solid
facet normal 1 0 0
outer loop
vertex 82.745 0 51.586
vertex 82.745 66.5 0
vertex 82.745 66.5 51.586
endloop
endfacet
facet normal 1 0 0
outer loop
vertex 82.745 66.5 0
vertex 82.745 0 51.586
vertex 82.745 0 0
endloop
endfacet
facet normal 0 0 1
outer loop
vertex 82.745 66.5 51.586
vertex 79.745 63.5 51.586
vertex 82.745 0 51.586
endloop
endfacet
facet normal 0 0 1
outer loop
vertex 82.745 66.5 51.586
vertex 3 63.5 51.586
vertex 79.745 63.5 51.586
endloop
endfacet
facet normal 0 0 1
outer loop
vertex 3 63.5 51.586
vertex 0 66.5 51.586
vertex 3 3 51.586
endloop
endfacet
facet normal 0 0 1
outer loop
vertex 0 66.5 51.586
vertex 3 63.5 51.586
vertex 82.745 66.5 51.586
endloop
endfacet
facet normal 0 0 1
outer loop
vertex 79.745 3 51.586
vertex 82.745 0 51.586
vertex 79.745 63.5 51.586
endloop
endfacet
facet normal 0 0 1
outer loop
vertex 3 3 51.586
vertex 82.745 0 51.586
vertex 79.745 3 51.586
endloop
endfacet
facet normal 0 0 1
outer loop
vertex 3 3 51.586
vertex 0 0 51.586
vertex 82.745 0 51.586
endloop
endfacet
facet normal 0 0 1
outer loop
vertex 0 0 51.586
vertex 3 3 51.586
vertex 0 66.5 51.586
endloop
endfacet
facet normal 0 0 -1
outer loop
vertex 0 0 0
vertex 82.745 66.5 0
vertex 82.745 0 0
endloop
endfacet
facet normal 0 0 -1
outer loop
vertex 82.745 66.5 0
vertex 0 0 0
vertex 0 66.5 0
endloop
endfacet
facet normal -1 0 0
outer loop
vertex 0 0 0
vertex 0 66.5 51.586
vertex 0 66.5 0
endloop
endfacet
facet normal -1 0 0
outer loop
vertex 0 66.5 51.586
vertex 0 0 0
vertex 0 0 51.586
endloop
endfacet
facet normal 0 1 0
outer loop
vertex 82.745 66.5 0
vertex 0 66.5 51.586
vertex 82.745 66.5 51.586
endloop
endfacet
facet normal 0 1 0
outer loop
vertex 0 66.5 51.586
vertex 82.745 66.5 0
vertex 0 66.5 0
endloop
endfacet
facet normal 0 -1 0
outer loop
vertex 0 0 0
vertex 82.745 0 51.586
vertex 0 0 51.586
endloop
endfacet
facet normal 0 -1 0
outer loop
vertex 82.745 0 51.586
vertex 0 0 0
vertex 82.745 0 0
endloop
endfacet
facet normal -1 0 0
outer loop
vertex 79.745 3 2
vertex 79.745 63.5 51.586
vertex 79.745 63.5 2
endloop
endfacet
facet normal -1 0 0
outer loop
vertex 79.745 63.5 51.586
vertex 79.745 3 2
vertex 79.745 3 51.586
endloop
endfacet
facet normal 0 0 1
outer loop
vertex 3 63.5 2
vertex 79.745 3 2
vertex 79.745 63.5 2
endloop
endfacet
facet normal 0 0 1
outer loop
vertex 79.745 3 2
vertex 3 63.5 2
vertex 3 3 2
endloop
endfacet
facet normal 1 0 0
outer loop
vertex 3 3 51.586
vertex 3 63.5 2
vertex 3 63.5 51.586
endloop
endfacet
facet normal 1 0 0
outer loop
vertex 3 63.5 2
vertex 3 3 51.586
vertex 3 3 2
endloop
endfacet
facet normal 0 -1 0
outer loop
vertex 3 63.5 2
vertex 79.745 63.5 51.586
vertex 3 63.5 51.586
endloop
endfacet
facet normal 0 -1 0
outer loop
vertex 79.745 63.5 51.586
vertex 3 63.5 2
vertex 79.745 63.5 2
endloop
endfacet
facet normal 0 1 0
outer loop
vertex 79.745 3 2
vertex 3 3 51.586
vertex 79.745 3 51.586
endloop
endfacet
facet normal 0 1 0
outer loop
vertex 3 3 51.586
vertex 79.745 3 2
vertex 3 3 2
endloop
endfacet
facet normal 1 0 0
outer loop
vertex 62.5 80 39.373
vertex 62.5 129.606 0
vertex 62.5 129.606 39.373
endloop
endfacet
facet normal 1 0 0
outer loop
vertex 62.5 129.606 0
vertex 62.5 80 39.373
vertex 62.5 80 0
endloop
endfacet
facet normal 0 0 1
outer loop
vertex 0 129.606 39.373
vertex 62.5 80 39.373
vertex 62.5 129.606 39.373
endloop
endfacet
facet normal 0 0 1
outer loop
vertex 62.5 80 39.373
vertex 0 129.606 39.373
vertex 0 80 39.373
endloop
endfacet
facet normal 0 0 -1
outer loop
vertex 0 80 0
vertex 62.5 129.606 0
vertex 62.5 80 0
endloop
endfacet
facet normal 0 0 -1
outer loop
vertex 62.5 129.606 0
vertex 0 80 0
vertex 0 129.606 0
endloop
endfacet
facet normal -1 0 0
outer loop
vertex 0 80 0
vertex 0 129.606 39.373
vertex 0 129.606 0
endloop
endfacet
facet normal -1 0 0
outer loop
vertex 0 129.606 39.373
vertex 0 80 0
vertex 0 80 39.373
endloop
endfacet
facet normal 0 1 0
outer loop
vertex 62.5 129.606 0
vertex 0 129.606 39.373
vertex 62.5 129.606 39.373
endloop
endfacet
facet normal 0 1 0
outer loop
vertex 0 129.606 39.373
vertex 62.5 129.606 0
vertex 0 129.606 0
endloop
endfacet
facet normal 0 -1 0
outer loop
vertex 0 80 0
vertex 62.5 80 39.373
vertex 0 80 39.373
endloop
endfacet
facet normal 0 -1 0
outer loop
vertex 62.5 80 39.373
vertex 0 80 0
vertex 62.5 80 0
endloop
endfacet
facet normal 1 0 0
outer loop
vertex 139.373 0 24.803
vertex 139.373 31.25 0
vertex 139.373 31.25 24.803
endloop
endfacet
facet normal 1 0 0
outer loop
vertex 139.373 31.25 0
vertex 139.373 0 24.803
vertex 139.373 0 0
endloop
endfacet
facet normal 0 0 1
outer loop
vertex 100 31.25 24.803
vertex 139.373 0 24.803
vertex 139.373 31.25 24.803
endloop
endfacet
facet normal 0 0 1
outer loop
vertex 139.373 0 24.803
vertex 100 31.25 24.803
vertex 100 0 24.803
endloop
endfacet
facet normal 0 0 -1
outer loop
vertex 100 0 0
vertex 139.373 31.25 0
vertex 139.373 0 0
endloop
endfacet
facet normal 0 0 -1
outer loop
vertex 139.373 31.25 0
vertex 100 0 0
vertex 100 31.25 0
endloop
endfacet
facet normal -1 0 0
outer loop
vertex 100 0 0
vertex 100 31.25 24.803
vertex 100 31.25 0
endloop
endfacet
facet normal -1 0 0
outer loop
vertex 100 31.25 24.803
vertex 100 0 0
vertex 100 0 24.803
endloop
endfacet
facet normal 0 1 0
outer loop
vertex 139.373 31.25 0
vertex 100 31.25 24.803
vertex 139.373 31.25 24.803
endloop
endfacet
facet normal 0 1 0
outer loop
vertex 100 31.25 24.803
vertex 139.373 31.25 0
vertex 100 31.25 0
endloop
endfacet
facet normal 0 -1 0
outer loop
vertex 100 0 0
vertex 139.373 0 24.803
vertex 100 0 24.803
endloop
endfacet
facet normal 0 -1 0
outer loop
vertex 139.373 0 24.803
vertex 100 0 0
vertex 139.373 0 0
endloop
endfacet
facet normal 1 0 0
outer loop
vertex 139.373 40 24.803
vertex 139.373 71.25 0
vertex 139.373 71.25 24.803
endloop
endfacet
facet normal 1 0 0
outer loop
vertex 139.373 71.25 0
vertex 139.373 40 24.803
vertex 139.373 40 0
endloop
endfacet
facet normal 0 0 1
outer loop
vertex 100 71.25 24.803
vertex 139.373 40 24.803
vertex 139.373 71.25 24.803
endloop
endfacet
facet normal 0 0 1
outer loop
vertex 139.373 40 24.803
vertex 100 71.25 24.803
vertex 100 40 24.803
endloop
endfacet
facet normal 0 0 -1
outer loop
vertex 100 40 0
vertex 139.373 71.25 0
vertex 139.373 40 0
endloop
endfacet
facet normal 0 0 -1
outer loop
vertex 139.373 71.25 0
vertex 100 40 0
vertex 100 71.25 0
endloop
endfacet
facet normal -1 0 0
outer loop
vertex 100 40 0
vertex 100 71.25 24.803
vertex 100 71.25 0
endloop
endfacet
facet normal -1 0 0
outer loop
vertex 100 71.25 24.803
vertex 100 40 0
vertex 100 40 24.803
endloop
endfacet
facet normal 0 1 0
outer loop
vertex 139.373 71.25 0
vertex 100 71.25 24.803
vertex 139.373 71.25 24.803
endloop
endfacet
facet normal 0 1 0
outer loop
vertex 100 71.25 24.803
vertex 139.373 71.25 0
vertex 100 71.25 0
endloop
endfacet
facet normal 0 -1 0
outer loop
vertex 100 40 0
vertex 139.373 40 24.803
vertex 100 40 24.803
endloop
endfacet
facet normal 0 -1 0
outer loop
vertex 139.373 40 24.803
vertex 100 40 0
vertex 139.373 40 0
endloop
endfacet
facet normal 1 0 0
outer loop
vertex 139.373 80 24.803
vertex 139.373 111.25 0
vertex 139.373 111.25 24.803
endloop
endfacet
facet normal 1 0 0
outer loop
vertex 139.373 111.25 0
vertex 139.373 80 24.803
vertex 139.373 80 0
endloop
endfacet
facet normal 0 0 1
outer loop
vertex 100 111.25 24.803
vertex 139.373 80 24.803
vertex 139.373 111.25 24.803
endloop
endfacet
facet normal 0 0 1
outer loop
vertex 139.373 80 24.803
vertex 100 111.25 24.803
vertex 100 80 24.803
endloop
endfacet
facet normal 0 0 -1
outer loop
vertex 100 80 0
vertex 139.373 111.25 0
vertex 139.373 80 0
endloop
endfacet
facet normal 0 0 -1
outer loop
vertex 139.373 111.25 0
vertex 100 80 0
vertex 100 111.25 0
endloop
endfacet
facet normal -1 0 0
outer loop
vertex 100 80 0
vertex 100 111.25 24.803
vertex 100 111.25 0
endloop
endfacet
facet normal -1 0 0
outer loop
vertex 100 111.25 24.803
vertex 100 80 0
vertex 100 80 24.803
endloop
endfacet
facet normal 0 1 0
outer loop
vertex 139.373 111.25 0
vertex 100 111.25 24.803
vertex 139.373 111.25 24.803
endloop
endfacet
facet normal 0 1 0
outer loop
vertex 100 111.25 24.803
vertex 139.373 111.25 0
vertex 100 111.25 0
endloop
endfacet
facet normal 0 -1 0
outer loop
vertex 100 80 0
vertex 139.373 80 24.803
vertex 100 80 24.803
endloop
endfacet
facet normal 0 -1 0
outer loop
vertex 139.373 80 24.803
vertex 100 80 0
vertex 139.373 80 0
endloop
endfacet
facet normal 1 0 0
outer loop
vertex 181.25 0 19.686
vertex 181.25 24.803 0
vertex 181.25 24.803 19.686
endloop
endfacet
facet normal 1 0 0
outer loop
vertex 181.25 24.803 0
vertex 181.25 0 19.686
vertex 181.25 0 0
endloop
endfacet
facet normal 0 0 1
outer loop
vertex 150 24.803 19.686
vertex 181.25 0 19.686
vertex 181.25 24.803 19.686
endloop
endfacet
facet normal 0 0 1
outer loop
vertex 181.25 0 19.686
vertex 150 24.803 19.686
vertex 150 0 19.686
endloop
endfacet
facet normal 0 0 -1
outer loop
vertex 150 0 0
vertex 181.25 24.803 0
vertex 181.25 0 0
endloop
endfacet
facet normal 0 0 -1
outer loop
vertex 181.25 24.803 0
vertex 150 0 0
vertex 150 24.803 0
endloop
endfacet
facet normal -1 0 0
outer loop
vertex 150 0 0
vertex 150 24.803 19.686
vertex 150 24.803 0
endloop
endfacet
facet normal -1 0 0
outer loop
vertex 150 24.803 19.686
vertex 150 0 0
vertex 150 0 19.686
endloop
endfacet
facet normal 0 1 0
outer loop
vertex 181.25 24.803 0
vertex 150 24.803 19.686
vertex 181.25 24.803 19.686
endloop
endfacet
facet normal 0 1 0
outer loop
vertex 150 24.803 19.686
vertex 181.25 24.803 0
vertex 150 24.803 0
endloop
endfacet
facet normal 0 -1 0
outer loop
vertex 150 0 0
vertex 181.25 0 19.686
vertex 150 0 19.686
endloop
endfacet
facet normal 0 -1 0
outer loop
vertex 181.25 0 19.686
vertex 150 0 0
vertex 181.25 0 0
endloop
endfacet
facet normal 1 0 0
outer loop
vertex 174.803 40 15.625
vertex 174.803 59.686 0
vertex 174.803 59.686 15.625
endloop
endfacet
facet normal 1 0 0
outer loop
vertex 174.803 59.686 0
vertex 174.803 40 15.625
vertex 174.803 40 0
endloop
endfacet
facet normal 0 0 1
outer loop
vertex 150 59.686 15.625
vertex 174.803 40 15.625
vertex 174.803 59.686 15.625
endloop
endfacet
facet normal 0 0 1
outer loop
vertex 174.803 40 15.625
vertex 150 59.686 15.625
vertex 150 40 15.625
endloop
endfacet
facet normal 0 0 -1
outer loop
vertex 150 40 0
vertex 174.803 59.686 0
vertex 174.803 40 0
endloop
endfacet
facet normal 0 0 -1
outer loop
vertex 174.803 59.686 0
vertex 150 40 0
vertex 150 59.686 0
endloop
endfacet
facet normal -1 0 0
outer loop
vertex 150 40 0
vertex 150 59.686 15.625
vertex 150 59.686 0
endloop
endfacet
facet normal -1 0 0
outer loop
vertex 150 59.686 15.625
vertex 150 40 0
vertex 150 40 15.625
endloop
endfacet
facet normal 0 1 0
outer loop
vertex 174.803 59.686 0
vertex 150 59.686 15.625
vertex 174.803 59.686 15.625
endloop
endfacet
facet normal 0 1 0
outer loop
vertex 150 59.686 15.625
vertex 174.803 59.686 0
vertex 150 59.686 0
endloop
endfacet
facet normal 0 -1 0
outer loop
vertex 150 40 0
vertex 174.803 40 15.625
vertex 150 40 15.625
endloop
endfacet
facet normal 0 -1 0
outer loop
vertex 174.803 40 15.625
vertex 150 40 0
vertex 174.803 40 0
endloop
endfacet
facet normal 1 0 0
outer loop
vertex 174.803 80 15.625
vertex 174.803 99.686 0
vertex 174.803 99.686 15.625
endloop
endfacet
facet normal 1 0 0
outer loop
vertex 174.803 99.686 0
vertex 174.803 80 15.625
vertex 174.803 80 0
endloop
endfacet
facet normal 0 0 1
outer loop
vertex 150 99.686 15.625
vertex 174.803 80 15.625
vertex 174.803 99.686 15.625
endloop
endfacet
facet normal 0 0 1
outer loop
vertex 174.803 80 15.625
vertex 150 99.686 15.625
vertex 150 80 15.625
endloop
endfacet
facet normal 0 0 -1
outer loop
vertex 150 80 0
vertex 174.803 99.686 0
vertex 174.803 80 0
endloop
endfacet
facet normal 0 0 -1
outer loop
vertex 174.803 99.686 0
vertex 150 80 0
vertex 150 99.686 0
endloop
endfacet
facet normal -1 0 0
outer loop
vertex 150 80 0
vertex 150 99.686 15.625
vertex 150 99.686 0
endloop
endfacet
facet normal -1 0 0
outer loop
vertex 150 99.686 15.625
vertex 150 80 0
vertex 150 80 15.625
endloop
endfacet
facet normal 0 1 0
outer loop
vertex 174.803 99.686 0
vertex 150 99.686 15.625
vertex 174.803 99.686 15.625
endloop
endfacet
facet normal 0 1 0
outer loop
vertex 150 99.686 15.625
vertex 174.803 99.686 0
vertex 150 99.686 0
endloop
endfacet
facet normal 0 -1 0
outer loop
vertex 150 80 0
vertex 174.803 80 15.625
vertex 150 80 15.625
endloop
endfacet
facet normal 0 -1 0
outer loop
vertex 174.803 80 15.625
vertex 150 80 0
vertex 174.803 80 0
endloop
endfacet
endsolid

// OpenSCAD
module metric_box(n) {
    cube(
        1000 * [
            pow(2, (1 - n) / 3),
            pow(2, -n/3),
            pow(2, (-1-n)/3)
        ]
    )
        ;
}

module metric_box_holder(n, thick=2, tol=1) {
    difference() {
        cube(
            1000 * [
                pow(2, (1 - n) / 3),
                pow(2, -n/3),
                pow(2, (-1-n)/3)
            ] + [2, 2, 0.99] * thick
        )
            ;
        translate([thick + tol, thick + tol, thick])
        cube(
            1000 * [
                pow(2, (1 - n) / 3),
                pow(2, -n/3),
                pow(2, (-1-n)/3)
            ] - [2, 2, 0] * tol
        )
            ;
    }
}

metric_box_holder(12)
    ;

translate([0, 80, 0])
metric_box(13)
    ;

translate([100, 0, 0])
metric_box(15)
    ;

translate([100, 40, 0])
metric_box(15)
    ;

translate([100, 80, 0])
metric_box(15)
    ;

translate([150, 0, 0])
metric_box(16)
    ;

translate([150, 40, 0])
metric_box(17)
    ;

translate([150, 80, 0])
metric_box(17)
    ;
